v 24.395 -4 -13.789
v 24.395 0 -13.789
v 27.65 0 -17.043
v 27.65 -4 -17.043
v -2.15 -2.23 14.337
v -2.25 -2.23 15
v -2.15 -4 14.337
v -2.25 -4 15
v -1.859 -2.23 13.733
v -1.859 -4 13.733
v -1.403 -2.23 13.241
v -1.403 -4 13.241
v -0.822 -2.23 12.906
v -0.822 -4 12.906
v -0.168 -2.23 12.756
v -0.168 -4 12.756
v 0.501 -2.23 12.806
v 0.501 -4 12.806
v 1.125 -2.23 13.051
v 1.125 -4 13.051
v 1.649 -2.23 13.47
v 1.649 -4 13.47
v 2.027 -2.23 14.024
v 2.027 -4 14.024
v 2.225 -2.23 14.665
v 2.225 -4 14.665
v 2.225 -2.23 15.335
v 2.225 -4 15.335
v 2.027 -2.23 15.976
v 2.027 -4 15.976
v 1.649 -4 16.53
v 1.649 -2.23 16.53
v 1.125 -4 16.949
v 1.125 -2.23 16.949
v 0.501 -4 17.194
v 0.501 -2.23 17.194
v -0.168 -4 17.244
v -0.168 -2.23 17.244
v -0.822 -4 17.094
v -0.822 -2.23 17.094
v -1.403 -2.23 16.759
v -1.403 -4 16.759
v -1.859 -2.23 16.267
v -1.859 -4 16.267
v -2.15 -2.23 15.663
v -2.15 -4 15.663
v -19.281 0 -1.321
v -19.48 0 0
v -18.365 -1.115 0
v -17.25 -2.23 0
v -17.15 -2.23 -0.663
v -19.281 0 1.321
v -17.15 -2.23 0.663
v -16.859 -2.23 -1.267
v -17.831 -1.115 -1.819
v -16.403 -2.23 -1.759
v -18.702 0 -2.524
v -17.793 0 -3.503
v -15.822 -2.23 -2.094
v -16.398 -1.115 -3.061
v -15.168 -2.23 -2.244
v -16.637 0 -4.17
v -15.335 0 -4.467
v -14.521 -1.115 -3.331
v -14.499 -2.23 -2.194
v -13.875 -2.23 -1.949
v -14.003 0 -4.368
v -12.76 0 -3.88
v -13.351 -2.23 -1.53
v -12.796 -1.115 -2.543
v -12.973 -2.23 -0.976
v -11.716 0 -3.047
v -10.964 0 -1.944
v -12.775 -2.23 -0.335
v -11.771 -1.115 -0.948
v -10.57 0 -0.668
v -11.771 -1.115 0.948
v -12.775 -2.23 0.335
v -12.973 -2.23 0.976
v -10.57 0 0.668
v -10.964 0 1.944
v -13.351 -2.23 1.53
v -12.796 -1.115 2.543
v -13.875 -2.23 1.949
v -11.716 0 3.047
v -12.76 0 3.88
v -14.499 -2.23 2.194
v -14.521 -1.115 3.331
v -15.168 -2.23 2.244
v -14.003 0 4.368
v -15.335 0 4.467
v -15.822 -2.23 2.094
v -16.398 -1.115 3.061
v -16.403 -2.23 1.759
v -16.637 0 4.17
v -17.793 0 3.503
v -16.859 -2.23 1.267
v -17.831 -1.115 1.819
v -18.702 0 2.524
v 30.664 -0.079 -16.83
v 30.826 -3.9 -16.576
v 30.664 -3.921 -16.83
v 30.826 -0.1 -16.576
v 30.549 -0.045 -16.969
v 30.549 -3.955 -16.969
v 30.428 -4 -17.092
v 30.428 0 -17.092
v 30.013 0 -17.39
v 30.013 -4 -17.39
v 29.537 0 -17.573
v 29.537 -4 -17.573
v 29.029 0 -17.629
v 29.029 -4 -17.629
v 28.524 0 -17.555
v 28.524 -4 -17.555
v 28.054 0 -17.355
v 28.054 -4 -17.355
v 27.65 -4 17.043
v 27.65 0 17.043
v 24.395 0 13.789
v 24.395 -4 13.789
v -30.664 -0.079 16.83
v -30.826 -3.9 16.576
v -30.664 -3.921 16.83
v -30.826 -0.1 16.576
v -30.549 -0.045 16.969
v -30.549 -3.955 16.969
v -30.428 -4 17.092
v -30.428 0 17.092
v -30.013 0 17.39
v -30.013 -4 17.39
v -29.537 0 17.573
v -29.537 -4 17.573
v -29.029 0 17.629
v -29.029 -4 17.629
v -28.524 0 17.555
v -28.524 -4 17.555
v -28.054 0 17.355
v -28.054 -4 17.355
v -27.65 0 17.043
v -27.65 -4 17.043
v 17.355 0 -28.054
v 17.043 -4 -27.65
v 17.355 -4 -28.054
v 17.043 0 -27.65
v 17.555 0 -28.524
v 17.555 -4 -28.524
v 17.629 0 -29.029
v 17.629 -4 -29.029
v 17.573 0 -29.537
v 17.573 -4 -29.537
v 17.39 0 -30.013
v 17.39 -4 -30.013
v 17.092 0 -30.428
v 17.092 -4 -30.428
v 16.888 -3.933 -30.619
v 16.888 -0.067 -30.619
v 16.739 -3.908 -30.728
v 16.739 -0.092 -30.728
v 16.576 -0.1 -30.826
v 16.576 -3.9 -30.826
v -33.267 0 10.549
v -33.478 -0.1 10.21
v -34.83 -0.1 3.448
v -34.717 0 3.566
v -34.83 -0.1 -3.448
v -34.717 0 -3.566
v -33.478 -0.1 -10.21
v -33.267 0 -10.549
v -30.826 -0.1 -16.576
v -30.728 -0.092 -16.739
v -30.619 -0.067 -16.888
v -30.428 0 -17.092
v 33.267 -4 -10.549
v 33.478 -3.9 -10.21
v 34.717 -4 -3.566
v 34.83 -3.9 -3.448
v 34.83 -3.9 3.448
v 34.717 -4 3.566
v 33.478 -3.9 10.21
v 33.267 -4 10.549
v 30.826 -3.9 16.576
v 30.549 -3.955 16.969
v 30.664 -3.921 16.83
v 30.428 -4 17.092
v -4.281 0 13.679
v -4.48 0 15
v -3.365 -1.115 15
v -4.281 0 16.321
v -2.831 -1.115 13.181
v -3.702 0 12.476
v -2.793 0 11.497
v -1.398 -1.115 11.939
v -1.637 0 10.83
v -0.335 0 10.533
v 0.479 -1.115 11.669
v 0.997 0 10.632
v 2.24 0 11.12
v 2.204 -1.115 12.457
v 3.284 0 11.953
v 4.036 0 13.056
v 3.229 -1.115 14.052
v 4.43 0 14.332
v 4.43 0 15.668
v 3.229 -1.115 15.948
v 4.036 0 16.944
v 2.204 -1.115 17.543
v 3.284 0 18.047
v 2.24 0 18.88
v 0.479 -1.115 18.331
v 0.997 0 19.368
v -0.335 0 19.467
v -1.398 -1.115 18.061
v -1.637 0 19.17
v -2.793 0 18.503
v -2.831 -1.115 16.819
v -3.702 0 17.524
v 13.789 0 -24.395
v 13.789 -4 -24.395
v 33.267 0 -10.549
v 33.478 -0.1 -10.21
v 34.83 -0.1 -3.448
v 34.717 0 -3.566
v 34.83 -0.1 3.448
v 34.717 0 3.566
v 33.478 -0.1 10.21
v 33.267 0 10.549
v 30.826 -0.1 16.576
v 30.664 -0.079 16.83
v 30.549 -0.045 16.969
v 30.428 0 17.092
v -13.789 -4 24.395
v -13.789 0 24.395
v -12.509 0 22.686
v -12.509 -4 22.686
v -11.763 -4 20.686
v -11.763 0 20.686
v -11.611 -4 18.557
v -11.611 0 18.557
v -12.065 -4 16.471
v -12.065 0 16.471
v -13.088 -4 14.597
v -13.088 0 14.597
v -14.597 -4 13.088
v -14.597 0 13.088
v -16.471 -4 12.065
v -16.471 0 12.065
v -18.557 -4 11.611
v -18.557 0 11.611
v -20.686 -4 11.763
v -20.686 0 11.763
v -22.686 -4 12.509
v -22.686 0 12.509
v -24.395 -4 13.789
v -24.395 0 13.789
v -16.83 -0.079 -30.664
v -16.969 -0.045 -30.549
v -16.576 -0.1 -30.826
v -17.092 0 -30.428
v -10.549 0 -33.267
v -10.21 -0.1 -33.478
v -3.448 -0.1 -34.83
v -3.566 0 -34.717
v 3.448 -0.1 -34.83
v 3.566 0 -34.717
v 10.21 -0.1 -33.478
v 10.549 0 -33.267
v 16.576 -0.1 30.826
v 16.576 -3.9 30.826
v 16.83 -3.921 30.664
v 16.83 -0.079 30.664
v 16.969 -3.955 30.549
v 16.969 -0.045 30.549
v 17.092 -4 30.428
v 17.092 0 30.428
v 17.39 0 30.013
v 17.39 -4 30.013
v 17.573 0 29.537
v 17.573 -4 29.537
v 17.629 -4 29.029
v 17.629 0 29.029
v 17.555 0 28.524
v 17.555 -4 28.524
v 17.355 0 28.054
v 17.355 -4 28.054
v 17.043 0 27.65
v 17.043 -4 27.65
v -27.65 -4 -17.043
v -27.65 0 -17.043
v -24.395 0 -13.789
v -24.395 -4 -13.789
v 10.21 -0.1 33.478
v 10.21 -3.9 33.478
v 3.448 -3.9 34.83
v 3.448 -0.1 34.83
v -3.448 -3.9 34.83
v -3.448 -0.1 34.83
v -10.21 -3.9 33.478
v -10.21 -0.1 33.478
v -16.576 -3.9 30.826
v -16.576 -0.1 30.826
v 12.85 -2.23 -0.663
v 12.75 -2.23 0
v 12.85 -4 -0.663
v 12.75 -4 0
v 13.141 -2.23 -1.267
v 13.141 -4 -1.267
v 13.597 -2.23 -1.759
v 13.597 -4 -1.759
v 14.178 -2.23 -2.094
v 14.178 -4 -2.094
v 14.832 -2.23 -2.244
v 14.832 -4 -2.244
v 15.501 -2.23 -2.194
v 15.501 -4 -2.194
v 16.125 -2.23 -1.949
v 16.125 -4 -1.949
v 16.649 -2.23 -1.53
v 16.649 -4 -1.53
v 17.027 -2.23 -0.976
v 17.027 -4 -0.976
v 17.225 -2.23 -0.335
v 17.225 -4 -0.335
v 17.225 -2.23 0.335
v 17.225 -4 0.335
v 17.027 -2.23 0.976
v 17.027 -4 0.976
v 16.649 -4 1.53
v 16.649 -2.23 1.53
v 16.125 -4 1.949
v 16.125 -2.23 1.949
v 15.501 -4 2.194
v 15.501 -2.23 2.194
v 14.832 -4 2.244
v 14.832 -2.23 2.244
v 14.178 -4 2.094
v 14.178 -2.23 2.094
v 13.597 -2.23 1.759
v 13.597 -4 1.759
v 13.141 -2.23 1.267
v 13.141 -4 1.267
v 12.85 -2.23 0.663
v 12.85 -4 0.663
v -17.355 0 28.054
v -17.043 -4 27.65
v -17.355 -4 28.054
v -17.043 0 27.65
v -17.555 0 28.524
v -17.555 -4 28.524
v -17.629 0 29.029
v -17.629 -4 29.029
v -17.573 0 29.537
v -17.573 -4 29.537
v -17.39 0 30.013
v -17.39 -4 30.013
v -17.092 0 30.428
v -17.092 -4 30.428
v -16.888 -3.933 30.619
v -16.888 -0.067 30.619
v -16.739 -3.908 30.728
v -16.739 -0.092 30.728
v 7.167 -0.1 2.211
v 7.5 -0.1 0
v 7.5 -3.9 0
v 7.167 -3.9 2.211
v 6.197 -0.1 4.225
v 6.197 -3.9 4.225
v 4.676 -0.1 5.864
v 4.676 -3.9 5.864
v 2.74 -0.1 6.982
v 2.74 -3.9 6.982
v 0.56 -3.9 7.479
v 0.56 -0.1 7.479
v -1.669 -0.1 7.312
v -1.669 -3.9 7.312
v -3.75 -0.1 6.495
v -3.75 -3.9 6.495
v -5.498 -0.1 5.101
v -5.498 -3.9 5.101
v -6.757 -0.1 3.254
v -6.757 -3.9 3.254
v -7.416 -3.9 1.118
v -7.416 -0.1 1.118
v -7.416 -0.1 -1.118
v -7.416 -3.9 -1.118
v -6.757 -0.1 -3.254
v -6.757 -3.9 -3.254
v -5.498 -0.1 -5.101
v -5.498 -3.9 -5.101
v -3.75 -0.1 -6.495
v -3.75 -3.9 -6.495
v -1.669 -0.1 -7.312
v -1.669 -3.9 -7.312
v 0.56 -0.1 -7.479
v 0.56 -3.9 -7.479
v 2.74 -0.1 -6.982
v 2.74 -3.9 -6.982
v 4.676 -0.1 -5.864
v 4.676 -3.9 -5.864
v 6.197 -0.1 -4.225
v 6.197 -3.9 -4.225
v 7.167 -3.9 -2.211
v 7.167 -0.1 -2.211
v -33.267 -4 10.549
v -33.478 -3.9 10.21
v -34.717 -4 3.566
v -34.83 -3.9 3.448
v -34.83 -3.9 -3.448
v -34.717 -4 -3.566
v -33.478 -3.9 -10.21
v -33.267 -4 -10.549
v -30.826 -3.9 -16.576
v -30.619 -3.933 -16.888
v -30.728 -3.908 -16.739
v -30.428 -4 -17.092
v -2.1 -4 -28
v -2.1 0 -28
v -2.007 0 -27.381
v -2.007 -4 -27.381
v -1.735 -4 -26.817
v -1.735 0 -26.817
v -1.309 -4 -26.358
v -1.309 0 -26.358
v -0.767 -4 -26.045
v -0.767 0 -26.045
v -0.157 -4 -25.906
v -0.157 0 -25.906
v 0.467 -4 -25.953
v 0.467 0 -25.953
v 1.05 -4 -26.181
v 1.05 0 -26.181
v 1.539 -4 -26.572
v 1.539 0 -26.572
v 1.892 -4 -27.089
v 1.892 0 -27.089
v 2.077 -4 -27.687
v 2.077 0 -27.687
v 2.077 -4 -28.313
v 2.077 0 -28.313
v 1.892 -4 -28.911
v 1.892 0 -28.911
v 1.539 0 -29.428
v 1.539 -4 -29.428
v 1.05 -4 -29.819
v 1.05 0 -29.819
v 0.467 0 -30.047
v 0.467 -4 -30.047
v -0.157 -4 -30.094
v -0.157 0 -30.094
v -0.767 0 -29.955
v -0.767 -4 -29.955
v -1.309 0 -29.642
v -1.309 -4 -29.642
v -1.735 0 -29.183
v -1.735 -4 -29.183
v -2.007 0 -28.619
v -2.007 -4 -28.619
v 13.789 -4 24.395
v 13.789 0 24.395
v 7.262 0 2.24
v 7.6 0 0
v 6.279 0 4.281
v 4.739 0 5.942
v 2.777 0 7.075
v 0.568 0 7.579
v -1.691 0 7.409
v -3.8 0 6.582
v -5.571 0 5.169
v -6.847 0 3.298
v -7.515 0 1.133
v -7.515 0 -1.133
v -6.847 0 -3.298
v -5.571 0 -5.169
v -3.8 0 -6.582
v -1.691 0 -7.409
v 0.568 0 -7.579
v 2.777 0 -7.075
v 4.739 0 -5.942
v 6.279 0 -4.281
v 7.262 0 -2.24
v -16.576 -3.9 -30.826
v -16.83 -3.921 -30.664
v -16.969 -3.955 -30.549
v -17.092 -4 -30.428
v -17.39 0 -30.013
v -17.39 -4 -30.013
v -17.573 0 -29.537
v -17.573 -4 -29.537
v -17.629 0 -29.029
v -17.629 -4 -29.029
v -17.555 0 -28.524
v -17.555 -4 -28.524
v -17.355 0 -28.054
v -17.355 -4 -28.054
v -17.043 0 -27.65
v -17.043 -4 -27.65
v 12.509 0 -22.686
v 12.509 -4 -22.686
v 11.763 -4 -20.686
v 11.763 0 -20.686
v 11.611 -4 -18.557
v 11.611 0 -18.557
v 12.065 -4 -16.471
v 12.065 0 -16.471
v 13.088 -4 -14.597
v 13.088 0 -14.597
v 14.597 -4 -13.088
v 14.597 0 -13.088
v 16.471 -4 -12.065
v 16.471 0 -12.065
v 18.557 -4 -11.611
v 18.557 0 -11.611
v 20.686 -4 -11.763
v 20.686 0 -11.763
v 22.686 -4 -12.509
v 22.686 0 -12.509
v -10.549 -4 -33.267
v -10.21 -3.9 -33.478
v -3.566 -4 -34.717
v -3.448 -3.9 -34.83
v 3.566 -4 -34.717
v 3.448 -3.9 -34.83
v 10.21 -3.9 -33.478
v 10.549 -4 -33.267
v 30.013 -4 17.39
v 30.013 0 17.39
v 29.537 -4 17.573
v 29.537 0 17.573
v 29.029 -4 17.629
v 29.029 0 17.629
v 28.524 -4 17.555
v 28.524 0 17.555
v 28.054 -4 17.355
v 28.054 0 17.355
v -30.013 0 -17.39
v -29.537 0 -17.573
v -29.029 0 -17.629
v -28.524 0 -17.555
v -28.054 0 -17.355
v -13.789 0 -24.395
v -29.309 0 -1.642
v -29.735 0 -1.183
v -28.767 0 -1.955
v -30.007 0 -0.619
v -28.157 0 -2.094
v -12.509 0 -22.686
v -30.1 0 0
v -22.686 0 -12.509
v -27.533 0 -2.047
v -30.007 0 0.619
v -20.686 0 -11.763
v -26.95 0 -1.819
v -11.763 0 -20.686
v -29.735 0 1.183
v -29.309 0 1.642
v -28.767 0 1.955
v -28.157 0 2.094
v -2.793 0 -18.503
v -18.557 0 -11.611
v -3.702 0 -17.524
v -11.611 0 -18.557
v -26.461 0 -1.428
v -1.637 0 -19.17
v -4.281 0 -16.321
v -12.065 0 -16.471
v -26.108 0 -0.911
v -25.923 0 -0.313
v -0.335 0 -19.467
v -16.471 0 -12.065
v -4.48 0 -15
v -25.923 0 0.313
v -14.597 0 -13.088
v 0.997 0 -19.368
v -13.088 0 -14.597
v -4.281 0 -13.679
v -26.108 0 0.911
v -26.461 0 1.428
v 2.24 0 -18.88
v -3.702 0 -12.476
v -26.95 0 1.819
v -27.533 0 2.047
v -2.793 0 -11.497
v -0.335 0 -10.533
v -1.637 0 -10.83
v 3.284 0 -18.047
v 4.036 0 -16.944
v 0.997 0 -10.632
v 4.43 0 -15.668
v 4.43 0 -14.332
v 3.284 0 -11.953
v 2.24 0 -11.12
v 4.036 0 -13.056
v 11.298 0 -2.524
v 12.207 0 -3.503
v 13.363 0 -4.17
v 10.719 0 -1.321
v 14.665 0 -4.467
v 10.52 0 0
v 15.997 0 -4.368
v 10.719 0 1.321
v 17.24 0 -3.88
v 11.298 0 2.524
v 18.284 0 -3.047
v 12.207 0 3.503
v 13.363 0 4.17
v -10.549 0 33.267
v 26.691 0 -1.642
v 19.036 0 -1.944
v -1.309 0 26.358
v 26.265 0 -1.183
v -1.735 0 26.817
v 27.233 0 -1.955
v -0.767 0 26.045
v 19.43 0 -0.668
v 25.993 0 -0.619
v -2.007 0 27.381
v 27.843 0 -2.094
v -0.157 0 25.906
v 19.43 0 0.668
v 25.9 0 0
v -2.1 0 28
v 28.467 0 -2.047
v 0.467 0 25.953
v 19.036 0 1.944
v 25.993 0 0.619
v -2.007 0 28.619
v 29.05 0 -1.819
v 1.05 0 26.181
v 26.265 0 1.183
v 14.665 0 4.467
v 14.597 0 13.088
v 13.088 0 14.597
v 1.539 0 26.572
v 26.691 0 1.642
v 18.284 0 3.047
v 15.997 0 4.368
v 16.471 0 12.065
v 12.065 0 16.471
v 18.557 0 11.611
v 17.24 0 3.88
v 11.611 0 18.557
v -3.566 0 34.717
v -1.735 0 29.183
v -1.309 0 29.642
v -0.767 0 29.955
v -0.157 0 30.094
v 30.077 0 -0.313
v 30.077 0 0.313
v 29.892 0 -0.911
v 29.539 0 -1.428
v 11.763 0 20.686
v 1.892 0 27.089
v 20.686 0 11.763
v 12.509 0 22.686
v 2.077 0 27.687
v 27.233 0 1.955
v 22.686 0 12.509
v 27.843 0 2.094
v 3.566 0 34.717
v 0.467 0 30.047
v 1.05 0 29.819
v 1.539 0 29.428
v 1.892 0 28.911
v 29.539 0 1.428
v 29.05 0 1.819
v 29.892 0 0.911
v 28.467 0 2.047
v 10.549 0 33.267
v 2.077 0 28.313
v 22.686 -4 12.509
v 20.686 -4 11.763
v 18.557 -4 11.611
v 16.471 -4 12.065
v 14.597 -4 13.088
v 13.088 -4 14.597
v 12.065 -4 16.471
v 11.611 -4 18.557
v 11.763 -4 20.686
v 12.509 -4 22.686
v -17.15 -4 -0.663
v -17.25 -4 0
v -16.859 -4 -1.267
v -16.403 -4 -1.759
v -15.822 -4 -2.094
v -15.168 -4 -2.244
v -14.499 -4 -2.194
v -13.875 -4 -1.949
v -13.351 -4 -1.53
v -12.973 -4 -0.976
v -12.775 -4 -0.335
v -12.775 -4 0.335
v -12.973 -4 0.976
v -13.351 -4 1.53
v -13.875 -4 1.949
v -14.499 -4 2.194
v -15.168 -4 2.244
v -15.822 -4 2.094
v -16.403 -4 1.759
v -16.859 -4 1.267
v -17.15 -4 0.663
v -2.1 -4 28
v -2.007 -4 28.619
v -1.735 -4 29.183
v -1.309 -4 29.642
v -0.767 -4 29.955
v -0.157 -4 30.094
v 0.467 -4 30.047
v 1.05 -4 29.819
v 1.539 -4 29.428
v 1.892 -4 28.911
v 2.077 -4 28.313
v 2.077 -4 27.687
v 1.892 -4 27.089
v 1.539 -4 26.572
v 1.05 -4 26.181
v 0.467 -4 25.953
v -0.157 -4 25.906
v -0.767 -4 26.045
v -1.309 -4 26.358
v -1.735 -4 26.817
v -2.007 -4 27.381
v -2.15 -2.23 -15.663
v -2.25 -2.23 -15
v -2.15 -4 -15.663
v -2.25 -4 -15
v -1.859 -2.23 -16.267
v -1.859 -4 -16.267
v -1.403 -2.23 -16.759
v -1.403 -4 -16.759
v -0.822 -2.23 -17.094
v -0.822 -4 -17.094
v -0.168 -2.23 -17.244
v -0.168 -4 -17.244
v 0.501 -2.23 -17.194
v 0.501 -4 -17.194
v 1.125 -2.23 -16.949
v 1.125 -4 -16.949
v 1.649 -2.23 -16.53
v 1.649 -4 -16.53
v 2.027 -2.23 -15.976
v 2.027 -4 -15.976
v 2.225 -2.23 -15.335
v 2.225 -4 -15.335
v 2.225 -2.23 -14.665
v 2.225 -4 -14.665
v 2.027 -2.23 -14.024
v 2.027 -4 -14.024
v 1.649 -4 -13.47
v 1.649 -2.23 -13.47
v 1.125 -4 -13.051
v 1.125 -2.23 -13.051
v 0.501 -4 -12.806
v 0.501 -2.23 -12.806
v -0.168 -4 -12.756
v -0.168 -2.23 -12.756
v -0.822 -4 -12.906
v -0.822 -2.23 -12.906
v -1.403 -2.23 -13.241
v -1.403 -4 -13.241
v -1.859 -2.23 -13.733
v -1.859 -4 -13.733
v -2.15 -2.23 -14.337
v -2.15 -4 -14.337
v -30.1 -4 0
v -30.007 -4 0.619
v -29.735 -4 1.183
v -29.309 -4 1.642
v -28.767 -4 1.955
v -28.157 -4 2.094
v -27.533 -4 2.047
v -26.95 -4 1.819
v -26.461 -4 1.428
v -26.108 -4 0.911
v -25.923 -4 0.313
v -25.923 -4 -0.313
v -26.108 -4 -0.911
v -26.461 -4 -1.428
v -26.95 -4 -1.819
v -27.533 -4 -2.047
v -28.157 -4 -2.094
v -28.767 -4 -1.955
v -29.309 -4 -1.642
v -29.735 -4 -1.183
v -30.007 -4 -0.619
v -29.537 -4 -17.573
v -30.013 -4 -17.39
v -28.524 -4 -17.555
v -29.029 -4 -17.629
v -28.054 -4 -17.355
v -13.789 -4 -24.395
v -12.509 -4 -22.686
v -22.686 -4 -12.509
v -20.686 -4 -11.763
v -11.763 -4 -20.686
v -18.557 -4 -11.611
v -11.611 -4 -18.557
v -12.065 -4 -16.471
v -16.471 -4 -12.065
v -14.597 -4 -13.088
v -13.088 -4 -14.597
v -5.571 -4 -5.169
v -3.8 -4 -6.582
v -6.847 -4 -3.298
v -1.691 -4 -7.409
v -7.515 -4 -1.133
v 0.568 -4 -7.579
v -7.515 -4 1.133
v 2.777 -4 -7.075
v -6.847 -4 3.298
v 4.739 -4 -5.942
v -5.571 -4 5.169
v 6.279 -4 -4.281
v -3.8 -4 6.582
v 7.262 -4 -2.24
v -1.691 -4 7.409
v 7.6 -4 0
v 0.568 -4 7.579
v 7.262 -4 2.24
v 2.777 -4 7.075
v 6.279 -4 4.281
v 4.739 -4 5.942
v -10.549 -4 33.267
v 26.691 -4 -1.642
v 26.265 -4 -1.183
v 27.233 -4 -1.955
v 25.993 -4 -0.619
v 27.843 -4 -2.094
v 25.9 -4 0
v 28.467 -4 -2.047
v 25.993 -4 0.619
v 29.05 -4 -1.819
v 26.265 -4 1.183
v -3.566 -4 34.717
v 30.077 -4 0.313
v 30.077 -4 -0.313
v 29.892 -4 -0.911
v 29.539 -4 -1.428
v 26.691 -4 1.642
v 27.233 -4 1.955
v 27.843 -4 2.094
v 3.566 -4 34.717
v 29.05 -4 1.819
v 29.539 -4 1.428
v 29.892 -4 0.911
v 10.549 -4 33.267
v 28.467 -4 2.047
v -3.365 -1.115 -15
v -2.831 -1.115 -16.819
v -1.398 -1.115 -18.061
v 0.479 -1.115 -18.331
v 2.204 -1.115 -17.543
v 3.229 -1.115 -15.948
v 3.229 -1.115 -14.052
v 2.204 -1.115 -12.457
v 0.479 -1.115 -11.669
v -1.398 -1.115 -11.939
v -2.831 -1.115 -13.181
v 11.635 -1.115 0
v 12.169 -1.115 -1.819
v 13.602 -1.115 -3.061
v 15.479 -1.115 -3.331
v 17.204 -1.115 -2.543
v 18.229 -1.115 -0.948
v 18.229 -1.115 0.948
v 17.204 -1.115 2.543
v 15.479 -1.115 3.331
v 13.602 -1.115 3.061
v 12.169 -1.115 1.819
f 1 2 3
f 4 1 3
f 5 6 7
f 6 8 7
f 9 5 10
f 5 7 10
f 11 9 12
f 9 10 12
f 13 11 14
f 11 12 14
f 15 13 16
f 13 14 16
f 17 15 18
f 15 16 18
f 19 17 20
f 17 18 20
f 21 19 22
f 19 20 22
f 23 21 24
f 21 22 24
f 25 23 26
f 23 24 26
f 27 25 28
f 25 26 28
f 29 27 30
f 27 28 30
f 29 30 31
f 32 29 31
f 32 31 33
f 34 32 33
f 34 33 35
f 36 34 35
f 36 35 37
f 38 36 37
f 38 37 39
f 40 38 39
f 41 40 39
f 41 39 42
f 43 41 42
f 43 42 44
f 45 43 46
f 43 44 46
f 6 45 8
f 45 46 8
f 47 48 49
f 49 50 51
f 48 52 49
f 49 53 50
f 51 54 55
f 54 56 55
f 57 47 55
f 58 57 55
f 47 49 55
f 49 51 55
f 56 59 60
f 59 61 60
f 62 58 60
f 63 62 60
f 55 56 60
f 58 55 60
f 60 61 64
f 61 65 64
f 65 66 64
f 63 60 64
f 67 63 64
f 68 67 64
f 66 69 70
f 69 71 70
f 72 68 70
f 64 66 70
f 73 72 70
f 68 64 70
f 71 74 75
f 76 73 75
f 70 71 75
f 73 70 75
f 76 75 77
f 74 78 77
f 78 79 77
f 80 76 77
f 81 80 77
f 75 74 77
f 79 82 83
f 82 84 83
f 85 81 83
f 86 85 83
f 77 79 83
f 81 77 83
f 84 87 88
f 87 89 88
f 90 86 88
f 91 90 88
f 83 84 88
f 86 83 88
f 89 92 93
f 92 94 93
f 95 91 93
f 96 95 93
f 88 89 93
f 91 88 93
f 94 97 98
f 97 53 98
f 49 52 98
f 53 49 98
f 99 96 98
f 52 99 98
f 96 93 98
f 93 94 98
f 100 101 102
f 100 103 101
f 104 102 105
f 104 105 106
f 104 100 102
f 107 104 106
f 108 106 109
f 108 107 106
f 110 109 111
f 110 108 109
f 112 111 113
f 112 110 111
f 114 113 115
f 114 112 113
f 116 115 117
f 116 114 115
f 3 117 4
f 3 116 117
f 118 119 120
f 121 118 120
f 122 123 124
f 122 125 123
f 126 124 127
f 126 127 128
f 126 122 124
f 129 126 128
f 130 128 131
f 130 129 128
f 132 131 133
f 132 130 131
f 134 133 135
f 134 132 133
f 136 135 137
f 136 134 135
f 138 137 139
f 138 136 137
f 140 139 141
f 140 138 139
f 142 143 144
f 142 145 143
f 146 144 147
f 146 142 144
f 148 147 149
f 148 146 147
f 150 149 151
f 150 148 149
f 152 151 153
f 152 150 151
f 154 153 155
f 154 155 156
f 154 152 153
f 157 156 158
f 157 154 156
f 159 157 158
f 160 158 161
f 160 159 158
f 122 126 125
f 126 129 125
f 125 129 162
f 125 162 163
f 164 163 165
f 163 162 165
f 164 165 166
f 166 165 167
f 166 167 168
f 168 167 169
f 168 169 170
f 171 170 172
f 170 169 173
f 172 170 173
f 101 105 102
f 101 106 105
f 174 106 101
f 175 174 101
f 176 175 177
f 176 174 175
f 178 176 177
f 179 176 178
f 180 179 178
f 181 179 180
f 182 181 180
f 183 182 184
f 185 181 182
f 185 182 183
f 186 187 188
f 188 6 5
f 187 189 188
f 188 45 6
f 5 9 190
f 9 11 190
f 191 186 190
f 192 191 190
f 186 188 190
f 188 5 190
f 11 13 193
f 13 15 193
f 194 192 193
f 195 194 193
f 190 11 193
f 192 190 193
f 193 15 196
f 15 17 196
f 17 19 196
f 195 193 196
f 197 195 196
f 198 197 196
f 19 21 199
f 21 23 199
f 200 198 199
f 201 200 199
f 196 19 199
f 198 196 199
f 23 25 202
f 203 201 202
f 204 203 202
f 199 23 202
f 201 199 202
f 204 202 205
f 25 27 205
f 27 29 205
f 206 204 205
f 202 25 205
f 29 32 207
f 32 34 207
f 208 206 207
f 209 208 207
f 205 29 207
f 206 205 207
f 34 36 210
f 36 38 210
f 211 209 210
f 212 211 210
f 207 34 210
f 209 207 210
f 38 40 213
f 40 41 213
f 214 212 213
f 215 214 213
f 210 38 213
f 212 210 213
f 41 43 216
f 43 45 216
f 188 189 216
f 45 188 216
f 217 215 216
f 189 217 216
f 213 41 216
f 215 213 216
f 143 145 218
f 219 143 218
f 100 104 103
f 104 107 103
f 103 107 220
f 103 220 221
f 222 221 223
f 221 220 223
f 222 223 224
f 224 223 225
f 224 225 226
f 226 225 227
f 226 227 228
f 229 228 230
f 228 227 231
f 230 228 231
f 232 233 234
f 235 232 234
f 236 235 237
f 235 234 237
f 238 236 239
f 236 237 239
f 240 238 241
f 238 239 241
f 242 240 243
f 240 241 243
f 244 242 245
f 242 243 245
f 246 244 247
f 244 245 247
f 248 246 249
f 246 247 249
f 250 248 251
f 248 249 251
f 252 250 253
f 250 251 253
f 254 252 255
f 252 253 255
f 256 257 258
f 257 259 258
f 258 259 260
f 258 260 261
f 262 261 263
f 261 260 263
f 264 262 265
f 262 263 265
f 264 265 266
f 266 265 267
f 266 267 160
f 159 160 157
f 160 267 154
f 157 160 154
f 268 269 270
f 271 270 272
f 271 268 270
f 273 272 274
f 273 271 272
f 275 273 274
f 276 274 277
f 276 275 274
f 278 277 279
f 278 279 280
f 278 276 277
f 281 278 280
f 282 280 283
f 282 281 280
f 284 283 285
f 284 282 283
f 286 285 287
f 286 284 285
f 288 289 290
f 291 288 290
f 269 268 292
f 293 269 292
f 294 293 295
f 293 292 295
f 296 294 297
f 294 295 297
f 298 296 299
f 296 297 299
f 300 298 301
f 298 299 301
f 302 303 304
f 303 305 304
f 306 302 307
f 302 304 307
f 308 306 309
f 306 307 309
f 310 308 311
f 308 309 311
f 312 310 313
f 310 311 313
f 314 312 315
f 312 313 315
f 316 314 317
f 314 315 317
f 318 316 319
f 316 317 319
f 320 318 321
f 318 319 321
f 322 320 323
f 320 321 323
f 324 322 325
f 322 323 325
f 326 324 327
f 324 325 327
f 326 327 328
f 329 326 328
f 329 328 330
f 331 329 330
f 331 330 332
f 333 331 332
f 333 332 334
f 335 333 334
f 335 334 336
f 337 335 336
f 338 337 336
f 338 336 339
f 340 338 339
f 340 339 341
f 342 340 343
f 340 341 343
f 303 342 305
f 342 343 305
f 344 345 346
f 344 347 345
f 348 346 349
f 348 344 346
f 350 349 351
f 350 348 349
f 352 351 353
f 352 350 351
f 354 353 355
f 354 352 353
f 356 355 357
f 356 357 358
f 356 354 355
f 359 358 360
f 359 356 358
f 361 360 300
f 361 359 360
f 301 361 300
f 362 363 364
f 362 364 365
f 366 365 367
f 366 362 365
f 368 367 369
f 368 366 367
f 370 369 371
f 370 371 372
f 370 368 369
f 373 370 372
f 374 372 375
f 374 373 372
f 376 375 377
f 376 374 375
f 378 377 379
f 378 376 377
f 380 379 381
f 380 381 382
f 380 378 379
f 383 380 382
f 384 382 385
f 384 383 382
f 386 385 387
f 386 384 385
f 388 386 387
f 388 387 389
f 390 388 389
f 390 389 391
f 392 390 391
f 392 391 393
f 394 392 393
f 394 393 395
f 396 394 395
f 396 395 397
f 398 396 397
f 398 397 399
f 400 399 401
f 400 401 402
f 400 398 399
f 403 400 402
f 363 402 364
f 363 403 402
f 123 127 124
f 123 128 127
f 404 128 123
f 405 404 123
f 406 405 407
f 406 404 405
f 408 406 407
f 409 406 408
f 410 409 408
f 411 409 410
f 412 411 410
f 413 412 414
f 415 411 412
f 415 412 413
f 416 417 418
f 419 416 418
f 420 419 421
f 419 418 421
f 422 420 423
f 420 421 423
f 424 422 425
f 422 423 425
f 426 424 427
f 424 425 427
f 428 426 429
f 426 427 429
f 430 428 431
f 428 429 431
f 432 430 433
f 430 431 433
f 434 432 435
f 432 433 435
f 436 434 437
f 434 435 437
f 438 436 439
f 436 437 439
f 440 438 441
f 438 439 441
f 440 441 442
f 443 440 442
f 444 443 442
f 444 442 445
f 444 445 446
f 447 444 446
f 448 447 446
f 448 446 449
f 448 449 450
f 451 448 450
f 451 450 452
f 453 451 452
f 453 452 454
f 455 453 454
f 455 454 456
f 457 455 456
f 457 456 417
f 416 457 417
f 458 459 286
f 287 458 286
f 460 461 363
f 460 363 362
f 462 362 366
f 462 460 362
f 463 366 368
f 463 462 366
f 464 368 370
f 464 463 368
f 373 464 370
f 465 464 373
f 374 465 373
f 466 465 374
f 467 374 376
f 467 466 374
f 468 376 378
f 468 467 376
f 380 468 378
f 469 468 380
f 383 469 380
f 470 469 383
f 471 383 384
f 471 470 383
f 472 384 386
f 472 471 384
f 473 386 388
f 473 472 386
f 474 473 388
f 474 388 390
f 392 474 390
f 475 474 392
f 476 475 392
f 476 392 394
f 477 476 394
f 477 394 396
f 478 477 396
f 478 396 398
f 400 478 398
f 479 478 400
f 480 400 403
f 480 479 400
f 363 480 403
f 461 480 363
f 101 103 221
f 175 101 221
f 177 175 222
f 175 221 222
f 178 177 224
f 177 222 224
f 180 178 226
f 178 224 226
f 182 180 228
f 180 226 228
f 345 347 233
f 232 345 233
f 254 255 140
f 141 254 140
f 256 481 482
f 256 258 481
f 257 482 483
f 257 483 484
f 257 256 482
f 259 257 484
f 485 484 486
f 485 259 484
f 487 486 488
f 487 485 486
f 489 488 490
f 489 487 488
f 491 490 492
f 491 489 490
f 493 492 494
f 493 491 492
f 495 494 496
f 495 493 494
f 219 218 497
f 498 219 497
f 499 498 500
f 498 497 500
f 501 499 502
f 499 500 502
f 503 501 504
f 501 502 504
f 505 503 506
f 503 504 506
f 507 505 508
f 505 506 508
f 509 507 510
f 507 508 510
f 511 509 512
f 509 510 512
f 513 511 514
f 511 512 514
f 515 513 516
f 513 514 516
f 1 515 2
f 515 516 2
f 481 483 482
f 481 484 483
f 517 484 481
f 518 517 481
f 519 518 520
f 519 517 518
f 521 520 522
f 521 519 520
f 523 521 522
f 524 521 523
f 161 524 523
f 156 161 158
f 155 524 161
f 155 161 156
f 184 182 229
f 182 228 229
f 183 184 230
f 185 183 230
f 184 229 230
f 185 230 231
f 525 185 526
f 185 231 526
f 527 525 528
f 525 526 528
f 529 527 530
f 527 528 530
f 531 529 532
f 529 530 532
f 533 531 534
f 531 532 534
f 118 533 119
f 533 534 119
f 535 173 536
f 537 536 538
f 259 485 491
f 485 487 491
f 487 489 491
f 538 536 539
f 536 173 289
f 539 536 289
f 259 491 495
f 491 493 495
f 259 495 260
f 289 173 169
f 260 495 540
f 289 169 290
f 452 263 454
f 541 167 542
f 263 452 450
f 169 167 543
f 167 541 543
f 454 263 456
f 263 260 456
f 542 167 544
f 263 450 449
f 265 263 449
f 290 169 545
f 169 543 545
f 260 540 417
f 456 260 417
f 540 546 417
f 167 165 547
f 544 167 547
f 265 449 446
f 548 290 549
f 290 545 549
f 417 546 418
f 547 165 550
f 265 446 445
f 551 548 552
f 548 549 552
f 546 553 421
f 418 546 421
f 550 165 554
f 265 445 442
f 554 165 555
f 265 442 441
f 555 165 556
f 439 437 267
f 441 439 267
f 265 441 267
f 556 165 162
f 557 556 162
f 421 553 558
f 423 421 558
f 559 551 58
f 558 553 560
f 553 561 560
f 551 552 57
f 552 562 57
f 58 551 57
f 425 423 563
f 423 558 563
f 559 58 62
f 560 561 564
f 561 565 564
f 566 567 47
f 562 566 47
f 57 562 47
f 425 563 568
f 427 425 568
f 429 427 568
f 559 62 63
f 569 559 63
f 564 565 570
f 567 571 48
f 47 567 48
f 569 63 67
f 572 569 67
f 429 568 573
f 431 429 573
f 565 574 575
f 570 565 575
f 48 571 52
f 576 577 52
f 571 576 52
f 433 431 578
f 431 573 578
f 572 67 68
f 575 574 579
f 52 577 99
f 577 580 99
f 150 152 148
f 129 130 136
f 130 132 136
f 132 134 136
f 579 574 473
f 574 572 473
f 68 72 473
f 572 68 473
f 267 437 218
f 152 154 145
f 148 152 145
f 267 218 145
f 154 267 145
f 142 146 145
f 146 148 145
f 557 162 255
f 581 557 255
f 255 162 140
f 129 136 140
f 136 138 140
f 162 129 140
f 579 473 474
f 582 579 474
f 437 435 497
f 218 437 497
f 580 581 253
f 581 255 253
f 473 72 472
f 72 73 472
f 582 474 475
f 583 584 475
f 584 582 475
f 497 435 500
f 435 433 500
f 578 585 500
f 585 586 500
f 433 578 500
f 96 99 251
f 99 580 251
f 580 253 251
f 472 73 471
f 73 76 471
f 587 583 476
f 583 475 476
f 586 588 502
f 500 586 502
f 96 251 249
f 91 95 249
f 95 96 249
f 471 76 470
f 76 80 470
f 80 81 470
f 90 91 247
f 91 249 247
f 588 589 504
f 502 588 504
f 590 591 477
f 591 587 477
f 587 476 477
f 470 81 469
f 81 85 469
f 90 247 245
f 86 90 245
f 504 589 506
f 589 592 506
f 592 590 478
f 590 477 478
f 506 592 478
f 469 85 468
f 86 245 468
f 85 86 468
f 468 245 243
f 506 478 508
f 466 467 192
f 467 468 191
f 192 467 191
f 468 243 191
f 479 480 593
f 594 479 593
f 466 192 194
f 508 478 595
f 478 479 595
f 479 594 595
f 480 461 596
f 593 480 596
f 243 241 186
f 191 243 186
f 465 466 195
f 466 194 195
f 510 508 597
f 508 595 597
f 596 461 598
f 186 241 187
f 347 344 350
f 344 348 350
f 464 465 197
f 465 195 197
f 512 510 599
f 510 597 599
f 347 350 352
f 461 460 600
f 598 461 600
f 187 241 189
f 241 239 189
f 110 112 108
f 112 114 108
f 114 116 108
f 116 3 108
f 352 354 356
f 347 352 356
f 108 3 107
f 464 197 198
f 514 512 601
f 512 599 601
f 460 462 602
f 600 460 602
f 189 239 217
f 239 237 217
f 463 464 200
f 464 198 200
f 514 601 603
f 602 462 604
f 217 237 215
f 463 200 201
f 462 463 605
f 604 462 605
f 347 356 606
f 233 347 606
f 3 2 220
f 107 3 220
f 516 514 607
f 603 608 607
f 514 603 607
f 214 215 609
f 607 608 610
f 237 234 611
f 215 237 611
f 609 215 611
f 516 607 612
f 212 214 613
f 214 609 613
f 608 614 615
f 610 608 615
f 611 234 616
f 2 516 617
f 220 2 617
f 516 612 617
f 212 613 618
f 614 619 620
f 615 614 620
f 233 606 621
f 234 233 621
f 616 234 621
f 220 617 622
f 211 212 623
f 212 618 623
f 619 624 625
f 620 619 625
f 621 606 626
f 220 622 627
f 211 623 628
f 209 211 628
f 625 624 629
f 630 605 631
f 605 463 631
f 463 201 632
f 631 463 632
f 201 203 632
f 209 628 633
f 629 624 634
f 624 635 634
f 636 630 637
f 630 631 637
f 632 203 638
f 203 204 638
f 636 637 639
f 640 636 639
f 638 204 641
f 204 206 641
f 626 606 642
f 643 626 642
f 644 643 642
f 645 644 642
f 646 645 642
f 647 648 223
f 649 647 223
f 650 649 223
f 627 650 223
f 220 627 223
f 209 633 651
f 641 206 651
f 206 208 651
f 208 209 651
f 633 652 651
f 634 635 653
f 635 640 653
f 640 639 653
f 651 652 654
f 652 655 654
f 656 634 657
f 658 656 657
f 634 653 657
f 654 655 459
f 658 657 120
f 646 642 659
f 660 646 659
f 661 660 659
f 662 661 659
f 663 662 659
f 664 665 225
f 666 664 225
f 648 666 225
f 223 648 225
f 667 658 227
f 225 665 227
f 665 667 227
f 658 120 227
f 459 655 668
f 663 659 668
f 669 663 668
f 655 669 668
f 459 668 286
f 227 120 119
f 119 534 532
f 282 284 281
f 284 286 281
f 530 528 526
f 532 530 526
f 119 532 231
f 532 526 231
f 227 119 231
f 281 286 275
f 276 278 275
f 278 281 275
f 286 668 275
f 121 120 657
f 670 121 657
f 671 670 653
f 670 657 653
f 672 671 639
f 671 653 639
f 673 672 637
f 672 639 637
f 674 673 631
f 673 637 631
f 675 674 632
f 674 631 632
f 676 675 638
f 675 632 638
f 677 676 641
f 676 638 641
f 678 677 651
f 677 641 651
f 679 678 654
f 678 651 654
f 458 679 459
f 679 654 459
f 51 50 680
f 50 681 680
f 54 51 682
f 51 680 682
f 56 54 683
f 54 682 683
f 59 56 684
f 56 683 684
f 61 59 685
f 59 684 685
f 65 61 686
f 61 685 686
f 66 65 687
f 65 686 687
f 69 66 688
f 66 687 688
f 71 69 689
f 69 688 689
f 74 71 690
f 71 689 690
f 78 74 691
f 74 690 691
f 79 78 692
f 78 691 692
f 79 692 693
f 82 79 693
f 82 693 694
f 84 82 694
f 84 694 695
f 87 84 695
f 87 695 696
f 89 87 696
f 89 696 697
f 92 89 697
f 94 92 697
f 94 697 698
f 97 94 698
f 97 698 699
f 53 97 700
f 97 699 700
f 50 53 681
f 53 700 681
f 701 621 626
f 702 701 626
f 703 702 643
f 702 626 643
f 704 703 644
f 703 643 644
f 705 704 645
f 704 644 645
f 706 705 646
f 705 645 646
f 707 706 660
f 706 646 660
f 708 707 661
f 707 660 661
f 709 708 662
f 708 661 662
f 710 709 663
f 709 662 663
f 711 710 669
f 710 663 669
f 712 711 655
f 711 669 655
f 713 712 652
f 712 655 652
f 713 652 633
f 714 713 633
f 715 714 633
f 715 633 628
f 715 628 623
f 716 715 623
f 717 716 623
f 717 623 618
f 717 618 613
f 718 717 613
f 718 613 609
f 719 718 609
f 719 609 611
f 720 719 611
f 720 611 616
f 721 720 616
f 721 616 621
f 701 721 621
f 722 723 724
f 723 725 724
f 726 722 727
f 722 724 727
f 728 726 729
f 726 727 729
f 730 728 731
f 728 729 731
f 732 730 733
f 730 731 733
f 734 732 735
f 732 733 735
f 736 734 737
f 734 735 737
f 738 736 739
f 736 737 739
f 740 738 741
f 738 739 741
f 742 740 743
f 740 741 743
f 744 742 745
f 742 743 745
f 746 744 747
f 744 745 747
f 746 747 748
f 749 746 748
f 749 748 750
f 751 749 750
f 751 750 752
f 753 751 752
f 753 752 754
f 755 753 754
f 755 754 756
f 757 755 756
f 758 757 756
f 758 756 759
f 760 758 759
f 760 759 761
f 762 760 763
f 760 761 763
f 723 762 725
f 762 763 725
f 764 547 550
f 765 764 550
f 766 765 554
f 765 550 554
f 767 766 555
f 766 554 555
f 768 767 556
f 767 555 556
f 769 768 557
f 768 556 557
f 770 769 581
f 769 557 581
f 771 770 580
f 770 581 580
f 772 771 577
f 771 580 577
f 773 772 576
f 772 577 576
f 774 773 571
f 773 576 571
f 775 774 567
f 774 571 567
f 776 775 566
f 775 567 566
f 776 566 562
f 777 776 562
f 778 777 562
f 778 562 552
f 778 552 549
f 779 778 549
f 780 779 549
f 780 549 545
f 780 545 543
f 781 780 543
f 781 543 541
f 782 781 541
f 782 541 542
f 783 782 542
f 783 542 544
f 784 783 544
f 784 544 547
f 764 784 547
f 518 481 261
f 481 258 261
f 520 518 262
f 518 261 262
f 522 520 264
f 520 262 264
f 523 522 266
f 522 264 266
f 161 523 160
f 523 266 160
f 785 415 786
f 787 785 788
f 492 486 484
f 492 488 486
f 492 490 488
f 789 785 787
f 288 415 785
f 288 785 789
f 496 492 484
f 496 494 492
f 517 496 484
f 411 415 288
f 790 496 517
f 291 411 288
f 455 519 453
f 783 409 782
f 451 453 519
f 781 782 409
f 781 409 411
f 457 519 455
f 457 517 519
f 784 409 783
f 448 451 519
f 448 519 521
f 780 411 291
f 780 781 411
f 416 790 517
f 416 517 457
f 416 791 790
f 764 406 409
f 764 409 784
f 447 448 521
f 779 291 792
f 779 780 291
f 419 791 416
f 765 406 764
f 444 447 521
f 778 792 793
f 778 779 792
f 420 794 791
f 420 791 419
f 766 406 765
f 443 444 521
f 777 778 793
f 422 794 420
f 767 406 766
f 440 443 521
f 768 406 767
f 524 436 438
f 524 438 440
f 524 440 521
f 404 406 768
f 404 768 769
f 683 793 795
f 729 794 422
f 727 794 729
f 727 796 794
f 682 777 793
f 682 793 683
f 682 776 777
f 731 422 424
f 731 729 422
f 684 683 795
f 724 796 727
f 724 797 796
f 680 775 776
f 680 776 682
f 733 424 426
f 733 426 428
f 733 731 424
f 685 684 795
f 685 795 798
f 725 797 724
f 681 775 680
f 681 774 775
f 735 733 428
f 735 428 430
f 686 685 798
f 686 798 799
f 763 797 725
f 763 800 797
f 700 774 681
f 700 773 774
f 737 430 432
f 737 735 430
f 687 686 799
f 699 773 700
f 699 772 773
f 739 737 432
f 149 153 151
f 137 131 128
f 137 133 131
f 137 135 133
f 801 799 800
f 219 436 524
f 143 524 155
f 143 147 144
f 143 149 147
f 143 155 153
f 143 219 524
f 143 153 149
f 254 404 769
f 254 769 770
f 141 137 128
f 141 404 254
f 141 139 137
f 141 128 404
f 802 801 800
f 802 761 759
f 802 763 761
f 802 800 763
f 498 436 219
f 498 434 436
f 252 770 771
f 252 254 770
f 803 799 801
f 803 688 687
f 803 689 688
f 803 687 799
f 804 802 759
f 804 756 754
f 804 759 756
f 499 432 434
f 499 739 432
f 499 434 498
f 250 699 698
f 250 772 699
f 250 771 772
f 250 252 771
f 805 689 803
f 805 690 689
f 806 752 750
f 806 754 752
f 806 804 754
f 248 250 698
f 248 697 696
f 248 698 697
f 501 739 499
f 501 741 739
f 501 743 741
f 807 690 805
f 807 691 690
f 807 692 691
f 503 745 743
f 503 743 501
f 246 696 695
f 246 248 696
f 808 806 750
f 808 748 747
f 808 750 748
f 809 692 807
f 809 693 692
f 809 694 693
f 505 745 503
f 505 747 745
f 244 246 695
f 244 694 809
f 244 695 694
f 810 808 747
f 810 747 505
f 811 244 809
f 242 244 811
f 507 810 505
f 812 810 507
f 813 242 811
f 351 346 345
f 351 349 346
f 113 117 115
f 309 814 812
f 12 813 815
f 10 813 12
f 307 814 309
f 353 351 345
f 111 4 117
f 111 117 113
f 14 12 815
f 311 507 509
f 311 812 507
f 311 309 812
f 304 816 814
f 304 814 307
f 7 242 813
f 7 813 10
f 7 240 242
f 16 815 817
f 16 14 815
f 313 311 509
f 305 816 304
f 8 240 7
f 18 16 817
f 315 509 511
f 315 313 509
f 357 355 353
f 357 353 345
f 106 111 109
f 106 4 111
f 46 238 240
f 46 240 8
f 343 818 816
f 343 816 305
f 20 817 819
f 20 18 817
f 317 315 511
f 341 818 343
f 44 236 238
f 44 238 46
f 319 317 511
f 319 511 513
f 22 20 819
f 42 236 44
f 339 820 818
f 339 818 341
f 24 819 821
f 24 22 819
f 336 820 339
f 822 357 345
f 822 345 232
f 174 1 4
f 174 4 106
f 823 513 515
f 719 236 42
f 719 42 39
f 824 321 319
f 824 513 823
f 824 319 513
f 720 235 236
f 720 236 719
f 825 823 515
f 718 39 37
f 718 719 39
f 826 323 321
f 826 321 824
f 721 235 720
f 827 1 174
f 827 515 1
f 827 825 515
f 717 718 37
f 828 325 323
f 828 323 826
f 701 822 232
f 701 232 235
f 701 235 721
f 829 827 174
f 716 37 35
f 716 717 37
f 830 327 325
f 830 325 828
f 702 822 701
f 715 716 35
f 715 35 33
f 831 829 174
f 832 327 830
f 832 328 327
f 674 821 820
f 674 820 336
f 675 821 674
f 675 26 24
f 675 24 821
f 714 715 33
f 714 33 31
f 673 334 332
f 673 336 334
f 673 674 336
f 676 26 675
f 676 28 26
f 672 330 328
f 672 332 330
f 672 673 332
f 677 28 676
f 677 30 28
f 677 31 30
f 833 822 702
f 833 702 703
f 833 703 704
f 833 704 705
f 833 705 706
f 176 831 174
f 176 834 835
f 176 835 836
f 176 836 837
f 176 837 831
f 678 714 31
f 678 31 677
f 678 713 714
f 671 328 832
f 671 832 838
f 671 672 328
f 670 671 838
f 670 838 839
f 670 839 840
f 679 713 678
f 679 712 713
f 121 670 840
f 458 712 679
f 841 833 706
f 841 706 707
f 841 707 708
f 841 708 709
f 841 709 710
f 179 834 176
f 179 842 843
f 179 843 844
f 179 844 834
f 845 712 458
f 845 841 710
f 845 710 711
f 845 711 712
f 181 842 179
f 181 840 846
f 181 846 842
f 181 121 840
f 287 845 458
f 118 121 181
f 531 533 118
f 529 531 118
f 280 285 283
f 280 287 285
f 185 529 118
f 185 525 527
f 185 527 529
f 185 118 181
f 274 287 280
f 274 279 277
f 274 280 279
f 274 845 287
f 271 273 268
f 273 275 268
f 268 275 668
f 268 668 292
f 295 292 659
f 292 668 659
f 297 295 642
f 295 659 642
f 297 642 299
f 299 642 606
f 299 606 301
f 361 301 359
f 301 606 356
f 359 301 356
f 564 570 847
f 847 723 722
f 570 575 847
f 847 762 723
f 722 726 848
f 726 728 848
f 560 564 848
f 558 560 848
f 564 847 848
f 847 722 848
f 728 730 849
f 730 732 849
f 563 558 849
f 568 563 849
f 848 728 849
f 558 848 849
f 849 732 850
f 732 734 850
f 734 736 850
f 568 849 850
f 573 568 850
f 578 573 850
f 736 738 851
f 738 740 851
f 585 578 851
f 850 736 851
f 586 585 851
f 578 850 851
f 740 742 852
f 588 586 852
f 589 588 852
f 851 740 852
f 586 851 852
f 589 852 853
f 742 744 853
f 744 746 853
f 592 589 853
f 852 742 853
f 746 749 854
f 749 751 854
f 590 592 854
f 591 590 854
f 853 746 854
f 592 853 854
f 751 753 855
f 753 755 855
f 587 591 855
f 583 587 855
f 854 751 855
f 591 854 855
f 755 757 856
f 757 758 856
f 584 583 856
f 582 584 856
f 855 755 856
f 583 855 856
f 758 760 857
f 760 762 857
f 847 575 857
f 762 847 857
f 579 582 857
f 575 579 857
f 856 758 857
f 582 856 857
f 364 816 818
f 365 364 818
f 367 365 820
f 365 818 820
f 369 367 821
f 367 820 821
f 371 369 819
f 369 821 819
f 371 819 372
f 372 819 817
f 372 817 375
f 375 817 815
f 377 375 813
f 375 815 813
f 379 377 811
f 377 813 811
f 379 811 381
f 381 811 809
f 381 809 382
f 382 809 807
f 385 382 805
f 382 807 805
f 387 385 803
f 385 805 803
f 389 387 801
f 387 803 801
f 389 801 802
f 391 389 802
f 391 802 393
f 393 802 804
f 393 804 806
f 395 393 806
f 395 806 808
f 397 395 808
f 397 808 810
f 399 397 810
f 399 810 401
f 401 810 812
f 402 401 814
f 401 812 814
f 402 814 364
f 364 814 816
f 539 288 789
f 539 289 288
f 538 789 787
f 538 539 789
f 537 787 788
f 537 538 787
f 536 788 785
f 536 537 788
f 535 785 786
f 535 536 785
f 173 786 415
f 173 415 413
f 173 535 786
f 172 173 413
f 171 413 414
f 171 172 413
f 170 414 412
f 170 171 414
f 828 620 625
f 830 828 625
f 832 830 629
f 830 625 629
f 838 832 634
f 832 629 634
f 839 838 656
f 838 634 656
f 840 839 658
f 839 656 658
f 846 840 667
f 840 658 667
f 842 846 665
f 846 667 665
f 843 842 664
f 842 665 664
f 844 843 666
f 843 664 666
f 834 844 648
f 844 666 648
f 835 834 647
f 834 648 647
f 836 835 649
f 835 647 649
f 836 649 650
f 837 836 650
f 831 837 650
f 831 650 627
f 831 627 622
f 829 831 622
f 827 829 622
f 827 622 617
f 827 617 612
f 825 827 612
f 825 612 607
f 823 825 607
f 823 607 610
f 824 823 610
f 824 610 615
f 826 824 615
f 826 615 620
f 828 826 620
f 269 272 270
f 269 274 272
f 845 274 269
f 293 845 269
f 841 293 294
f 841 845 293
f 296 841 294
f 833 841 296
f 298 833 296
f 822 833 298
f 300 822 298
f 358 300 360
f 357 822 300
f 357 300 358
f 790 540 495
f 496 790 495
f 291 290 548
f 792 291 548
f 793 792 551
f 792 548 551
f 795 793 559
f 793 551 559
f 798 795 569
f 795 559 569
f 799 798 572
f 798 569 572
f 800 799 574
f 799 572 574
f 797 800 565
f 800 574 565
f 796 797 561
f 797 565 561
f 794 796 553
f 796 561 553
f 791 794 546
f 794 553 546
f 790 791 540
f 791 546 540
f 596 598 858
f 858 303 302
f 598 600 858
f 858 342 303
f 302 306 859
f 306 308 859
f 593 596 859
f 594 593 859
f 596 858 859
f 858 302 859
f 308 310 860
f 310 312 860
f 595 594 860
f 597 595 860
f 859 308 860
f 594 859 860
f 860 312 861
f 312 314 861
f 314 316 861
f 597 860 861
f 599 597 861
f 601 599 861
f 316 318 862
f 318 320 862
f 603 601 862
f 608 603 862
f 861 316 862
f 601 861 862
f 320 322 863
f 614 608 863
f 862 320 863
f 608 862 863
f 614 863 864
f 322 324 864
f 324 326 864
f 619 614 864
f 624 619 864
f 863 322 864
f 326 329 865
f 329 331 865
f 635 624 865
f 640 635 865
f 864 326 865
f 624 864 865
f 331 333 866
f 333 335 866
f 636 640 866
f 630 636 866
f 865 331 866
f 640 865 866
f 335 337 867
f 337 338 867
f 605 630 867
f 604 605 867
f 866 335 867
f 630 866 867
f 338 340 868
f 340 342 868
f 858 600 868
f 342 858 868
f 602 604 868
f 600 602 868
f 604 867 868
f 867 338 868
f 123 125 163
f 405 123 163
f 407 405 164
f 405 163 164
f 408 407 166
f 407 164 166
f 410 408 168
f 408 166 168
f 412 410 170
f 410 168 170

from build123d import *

# Parameters (mm, degrees)
F0_R           = 35
F0_R_2         = 7.5
F1_DEPTH       = 4
F2_SIZE        = 0.1
F4_D           = 4.5
F4_CSINK_D     = 8.96
F4_CSINK_ANGLE = 90
F6_DEPTH       = 4
F7_R           = 2
F9_D           = 4.2


# Not quite as in the source:
# - a feature names something its author has since deleted; it is built from what else it names


with BuildPart() as f1:
    # F0 (on Front) → F1 (new body)
    with BuildSketch(Plane.XZ):
        Circle(F0_R)
        Circle(F0_R_2, mode=Mode.SUBTRACT)
    extrude(amount=F1_DEPTH)

    # F2
    f2_edges = [f1.edges().sort_by_distance(p)[0] for p in [
        (-35, -4, 0),
        (-35, 0, 0),
        (-7.5, 0, 0),
        (-7.5, -4, 0),
    ]]
    chamfer(f2_edges, length=F2_SIZE)

    # F4 (through all)
    with Locations(Plane(origin=(0, 0, 0), x_dir=(1, 0, 0), z_dir=(0, 1, 0))):
        with Locations((-15, 0), (0, 15), (15, 0), (0, -15)):
            CounterSinkHole(F4_D / 2, F4_CSINK_D / 2, counter_sink_angle=F4_CSINK_ANGLE)

    # F5 (on face) → F6 (cut, through all)
    with BuildSketch(Plane(origin=(0, 0, 0), x_dir=(-1, 0, 0), z_dir=(0, 1, 0))):
        with BuildLine():
            Line((-25.2671224679, -35.8737241857), (-13.7885822331, -24.3951839509))
            ThreePointArc((-13.7885822331, -24.3951839509), (-13.7885822331, -13.7885822331), (-24.3951839509, -13.7885822331))
            Line((-24.3951839509, -13.7885822331), (-35.8737241857, -25.2671224679))
            Line((-35.8737241857, -25.2671224679), (-25.2671224679, -35.8737241857))
        make_face()
        with BuildLine():
            Line((13.7885822331, -24.3951839509), (25.2671224679, -35.8737241857))
            Line((25.2671224679, -35.8737241857), (35.8737241857, -25.2671224679))
            Line((35.8737241857, -25.2671224679), (24.3951839509, -13.7885822331))
            ThreePointArc((24.3951839509, -13.7885822331), (13.7885822331, -13.7885822331), (13.7885822331, -24.3951839509))
        make_face()
        with BuildLine():
            Line((24.3951839509, 13.7885822331), (35.8737241857, 25.2671224679))
            Line((35.8737241857, 25.2671224679), (25.2671224679, 35.8737241857))
            Line((25.2671224679, 35.8737241857), (13.7885822331, 24.3951839509))
            ThreePointArc((13.7885822331, 24.3951839509), (13.7885822331, 13.7885822331), (24.3951839509, 13.7885822331))
        make_face()
        with BuildLine():
            Line((-13.7885822331, 24.3951839509), (-25.2671224679, 35.8737241857))
            Line((-25.2671224679, 35.8737241857), (-35.8737241857, 25.2671224679))
            Line((-35.8737241857, 25.2671224679), (-24.3951839509, 13.7885822331))
            ThreePointArc((-24.3951839509, 13.7885822331), (-13.7885822331, 13.7885822331), (-13.7885822331, 24.3951839509))
        make_face()
    extrude(amount=-F6_DEPTH, mode=Mode.SUBTRACT)

    # F7
    f7_edges = [f1.edges().sort_by_distance(p)[0] for p in [
        (29.47715, -2, -18.870549),
        (18.870549, -2, -29.47715),
        (-18.870549, -2, -29.47715),
        (-29.47715, -2, -18.870549),
        (-29.47715, -2, 18.870549),
        (-18.870549, -2, 29.47715),
        (18.870549, -2, 29.47715),
        (29.47715, -2, 18.870549),
    ]]
    fillet(f7_edges, radius=F7_R)

    # F9 (through all)
    with Locations(Plane.XZ.offset(4)):
        with Locations((0, 28), (28, 0), (0, -28), (-28, 0)):
            Hole(F9_D / 2)


solid = f1.part
